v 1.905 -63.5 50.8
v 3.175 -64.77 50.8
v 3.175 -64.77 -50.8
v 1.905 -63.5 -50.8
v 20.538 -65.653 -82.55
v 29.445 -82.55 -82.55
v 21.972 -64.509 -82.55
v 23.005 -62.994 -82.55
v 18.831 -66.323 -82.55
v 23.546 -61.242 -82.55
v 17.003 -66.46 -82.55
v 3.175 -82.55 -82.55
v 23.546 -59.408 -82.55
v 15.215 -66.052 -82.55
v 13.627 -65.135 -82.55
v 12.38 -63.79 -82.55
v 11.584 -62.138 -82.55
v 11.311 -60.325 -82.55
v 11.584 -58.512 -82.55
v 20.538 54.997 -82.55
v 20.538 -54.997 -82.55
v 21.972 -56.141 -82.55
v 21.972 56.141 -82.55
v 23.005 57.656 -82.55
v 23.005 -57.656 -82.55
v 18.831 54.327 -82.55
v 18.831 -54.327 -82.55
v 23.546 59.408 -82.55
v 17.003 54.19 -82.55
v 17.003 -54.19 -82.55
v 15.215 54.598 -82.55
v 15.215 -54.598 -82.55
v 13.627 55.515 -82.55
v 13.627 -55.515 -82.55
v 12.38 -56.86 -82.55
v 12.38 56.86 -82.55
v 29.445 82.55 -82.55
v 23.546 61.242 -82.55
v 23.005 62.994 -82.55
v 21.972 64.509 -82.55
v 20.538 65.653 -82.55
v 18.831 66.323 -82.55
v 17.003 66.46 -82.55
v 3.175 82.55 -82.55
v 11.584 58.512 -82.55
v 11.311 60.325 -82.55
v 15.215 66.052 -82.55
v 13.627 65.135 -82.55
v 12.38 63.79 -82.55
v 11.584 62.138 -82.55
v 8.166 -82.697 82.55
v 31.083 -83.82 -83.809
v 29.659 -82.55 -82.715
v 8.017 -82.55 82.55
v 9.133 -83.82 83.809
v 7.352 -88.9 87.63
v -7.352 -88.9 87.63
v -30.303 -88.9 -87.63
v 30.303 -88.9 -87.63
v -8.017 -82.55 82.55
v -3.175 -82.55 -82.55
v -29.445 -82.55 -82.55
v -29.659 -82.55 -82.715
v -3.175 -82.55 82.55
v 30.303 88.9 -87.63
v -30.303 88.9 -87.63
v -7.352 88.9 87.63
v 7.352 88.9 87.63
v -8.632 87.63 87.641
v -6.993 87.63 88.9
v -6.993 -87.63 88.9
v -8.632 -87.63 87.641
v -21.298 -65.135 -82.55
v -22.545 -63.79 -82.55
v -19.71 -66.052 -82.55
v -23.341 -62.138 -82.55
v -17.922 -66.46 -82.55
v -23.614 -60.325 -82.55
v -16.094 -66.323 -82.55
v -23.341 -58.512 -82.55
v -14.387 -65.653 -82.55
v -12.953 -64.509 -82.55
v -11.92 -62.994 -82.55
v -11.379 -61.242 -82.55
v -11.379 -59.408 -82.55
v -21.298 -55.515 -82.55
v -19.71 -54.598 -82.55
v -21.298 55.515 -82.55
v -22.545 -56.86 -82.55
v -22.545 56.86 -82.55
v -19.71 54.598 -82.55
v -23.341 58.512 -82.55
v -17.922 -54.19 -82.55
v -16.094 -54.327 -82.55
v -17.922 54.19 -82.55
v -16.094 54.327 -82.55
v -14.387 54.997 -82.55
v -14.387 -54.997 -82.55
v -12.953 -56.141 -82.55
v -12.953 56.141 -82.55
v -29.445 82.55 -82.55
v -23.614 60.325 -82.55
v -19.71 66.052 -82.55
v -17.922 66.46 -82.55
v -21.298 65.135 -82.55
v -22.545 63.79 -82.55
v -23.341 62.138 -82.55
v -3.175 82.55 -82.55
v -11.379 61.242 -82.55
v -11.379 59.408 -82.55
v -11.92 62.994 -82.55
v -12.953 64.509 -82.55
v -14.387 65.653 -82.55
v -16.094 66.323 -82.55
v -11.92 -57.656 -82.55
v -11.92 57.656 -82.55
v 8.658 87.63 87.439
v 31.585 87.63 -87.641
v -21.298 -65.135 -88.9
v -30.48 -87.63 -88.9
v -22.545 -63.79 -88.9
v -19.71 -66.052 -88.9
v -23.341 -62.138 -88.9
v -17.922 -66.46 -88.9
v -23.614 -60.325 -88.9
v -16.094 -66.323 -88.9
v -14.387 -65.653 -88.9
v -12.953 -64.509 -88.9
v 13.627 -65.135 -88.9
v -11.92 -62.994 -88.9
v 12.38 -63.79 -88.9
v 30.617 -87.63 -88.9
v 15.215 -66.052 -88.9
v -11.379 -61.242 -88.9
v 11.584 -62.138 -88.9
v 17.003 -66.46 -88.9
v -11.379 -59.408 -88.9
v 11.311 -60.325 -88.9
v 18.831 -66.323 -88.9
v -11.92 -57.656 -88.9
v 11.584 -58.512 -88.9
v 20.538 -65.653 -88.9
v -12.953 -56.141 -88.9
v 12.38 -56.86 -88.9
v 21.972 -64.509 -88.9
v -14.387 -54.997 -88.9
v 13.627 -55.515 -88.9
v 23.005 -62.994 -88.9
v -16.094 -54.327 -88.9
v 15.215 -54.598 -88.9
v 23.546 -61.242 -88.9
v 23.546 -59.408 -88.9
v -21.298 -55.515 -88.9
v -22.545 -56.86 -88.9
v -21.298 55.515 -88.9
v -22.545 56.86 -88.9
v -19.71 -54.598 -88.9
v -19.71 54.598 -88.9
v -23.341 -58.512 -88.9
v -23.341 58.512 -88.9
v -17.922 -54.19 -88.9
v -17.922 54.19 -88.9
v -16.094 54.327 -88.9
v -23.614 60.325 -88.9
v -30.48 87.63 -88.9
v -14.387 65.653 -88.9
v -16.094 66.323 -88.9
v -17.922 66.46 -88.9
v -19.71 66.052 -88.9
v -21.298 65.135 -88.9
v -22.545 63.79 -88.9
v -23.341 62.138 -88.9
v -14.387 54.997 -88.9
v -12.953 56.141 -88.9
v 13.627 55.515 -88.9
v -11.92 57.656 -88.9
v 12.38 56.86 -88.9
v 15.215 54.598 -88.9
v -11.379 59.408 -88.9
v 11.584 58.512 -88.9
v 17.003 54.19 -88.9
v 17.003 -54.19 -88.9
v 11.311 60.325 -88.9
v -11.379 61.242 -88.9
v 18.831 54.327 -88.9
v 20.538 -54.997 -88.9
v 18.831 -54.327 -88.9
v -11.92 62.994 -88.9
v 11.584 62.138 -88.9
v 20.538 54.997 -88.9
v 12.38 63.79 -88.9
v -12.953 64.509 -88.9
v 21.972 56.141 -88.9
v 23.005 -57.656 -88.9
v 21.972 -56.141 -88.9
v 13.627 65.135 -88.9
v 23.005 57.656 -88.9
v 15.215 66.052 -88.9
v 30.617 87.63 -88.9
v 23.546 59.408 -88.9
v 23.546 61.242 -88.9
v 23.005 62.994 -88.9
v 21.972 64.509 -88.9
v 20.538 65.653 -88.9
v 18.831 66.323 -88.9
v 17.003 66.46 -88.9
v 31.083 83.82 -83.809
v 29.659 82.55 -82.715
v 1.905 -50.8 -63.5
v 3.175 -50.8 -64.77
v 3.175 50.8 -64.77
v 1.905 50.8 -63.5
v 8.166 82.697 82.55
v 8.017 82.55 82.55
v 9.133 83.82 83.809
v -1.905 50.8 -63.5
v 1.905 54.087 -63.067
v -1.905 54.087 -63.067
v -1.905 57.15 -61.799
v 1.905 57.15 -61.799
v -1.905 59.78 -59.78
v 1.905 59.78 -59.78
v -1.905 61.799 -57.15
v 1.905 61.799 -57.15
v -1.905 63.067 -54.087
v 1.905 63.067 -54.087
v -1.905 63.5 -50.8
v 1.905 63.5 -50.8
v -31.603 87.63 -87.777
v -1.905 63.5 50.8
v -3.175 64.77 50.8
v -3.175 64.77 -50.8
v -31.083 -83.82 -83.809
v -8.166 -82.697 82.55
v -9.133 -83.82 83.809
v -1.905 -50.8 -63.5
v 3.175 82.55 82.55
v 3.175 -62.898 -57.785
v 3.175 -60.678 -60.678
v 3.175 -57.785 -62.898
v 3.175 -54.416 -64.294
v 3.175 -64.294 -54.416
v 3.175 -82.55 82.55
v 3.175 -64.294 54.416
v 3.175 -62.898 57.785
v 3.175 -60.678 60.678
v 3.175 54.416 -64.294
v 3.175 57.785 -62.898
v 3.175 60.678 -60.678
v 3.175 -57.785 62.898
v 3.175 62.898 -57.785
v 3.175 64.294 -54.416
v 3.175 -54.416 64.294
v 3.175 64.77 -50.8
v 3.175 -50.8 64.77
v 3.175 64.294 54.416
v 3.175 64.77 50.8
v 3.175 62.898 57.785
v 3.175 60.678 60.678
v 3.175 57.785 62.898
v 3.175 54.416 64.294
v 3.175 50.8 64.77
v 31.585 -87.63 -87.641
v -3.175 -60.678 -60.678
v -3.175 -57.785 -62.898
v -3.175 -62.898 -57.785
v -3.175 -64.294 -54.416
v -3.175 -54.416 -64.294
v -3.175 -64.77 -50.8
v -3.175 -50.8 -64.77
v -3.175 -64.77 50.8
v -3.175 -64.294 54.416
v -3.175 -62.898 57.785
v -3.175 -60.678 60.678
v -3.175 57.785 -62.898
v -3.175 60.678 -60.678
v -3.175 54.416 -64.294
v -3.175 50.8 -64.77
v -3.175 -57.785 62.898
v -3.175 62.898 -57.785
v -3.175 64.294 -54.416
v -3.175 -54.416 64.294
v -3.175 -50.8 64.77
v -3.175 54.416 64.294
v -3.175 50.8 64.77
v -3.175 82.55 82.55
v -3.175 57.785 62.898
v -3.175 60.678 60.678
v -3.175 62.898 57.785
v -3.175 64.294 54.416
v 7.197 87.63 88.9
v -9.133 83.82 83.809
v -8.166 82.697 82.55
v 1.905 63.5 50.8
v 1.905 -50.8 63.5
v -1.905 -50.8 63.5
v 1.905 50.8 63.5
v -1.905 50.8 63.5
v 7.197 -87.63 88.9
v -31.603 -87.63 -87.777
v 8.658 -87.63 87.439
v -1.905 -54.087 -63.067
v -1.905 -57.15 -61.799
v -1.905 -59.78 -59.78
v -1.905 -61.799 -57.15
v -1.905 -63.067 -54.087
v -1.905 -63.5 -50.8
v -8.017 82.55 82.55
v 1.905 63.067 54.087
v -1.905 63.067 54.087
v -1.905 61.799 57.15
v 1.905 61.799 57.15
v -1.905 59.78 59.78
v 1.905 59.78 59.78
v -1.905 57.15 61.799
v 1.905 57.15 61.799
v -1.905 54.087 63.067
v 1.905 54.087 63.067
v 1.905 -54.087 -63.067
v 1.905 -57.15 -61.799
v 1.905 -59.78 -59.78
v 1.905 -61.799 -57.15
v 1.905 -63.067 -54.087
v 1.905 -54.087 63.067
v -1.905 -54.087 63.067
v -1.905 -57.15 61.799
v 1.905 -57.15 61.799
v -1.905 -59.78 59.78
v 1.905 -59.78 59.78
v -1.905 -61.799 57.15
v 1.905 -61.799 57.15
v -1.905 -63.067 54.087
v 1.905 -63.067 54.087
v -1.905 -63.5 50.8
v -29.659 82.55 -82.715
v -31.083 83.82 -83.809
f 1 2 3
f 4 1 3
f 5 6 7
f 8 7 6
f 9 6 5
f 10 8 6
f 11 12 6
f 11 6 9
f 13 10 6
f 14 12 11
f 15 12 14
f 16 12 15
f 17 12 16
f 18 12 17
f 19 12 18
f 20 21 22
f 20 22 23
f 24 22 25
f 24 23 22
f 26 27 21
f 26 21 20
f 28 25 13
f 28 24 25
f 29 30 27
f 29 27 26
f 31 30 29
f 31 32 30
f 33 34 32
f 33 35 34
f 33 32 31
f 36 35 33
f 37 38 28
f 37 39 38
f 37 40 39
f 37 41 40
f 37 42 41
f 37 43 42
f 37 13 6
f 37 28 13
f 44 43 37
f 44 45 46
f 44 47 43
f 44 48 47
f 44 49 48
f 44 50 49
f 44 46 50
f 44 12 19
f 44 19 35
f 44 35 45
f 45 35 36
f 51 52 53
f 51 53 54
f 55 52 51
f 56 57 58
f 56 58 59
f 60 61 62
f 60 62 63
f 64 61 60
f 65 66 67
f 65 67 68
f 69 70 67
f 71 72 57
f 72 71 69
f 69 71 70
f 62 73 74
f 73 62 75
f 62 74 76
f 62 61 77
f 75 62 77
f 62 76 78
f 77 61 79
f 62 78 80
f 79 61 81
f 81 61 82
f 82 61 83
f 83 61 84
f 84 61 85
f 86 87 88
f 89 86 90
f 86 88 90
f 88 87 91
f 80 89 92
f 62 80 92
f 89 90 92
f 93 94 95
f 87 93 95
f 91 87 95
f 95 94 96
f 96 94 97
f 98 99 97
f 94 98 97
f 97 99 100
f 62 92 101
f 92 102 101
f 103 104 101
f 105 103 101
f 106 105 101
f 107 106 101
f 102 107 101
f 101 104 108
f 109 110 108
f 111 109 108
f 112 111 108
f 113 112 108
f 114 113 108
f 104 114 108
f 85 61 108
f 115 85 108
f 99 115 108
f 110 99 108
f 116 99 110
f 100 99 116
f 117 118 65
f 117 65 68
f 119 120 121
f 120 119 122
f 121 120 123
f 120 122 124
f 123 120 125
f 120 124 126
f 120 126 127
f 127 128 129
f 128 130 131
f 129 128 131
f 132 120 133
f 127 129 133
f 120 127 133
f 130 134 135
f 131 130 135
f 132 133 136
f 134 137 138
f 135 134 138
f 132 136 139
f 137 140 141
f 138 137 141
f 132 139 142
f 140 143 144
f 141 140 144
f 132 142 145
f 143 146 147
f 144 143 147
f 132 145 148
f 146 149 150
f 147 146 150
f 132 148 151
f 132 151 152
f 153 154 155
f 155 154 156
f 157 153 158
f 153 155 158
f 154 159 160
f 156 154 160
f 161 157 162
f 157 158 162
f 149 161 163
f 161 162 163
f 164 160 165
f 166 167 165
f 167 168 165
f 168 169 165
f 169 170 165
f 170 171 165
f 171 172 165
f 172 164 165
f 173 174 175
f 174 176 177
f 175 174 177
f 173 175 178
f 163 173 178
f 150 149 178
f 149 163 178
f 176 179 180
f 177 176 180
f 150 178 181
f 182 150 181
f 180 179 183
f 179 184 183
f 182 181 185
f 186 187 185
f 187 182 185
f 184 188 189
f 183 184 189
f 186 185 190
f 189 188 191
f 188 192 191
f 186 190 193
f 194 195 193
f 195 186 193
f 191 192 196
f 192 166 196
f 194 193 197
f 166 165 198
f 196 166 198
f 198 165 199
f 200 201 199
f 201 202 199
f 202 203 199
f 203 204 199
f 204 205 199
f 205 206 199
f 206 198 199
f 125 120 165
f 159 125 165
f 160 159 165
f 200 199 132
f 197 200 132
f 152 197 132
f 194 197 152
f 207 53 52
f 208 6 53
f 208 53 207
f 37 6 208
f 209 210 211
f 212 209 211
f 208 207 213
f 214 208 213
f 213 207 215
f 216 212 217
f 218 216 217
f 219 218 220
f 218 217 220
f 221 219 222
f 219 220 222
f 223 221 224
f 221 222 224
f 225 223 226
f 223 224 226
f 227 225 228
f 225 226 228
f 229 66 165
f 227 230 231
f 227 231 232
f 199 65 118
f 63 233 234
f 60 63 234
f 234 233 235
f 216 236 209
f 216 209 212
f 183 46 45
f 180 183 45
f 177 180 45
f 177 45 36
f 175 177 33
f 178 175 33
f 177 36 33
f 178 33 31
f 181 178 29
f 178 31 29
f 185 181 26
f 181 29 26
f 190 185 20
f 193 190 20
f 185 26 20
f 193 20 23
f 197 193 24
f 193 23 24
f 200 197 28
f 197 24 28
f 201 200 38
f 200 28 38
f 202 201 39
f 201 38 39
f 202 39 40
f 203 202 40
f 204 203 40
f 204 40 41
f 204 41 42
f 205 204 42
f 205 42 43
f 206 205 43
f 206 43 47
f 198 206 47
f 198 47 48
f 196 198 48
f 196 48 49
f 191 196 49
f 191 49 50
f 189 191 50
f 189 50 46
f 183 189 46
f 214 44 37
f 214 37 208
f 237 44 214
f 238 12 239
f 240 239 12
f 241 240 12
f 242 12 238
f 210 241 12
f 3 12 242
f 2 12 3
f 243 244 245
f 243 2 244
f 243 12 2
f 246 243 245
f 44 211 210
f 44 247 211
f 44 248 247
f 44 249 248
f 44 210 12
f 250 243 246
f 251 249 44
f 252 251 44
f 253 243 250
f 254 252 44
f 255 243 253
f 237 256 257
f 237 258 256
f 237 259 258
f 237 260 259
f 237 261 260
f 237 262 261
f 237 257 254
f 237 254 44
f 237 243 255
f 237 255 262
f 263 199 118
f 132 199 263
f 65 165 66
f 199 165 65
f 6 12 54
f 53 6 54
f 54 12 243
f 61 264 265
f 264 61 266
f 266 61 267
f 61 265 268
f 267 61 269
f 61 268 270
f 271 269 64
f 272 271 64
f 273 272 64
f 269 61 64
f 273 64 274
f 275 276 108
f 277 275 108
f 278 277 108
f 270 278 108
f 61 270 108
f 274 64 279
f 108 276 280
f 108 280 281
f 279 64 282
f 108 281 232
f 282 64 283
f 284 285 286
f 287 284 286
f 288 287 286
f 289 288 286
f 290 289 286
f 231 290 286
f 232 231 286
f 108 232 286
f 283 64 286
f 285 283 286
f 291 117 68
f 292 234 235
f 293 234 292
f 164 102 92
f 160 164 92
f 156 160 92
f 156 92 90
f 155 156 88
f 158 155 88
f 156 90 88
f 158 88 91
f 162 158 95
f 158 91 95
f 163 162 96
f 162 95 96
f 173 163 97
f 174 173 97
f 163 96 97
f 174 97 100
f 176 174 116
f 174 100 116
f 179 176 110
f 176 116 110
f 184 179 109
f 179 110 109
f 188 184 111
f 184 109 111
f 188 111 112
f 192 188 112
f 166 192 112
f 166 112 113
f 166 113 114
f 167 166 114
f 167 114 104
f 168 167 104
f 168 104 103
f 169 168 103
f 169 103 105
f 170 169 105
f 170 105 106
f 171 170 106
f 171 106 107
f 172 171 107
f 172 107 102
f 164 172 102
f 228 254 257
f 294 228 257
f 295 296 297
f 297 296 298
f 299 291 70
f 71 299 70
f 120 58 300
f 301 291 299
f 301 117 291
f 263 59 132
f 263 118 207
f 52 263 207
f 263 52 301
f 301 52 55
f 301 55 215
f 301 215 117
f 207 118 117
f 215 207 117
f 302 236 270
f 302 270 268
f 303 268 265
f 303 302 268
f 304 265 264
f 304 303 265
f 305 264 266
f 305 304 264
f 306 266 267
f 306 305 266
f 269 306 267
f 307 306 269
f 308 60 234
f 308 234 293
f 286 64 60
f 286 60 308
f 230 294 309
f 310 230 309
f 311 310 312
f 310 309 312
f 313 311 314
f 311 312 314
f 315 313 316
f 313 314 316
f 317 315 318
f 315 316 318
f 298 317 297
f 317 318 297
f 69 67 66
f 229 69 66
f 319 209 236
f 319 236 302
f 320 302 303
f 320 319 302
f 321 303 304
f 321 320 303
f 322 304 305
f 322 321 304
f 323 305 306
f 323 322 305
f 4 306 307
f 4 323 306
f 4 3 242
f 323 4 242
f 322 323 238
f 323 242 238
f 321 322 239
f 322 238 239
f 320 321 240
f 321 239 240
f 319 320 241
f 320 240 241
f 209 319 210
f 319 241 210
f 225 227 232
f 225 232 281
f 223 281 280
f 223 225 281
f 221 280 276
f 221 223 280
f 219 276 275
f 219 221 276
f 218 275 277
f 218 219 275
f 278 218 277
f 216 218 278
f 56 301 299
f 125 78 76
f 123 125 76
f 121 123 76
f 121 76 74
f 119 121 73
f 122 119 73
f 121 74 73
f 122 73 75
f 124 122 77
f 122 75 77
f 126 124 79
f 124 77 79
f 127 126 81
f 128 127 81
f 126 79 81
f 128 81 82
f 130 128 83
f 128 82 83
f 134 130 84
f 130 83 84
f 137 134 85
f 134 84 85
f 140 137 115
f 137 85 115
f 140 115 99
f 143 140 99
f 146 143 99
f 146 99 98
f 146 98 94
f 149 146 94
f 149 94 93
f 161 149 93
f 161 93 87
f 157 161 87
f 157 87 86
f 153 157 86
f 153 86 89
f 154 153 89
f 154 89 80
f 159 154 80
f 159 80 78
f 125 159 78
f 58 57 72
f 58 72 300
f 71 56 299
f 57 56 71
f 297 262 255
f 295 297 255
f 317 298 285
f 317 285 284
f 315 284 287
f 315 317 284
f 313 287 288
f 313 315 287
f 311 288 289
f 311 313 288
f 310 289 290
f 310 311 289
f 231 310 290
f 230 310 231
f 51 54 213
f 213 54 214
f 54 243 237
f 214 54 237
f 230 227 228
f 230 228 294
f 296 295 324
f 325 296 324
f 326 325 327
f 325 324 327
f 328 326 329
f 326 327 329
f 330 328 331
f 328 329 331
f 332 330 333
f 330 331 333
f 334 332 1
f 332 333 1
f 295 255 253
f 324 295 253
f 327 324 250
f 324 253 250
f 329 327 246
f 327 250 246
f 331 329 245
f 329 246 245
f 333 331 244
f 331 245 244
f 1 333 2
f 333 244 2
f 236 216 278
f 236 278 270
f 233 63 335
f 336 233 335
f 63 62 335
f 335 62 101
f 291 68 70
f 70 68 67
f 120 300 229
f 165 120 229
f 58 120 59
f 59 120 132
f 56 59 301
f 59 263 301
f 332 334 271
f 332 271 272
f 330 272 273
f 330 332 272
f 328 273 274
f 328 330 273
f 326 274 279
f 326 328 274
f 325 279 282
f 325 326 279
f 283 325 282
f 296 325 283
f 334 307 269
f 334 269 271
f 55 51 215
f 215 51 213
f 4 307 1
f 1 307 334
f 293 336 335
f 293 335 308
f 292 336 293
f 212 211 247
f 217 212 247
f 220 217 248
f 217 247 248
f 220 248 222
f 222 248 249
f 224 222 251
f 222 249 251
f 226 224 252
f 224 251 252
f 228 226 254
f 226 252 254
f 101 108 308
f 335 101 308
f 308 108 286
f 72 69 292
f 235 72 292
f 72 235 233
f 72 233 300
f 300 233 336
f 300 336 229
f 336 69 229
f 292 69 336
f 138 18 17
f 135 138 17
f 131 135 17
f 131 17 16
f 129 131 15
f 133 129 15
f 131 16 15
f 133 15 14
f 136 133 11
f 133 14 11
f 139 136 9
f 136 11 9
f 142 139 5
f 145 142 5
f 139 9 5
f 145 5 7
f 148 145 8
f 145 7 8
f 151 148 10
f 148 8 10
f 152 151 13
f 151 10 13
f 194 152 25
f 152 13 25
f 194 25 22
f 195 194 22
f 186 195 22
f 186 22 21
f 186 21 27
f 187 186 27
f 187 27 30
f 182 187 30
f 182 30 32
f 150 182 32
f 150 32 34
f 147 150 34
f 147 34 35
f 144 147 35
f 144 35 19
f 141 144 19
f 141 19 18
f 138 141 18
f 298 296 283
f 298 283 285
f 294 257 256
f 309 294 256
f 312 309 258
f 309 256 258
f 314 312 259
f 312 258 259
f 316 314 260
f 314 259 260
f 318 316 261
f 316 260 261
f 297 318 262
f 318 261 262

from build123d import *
from OCP.BRepFilletAPI import BRepFilletAPI_MakeChamfer

# Parameters (mm, degrees)
BOSS_EXTRUDE1_DEPTH      = 88.9
CUT_EXTRUDE2_DEPTH       = 130.67066939
CUT_EXTRUDE2_DEPTH_BACK  = 130.67066939
SKETCH12_W               = 127
SKETCH12_H               = 127
CUT_EXTRUDE3_START       = -3.175
SKETCH11_W               = 165.1
SKETCH11_H               = 165.1
CUT_EXTRUDE3_DEPTH       = 127.49566939
CUT_EXTRUDE4_START       = 3.175
SKETCH11_2_W             = 165.1
SKETCH11_2_H             = 165.1
CUT_EXTRUDE4_DEPTH       = 127.49566939
FILLET3_R                = 12.7
F_9_16_12_TAPPED_HOLE1_D = 12.30376
CHAMFER2_SIZE            = 1.27
CHAMFER2_SIZE2           = 1.132534886
CHAMFER2_SIZE2_2         = 1.47384677


with BuildPart() as part:
    # Sketch1 → Boss-Extrude1 (new, symmetric)
    with BuildSketch(Plane(origin=(0, 0, 0), x_dir=(-1, 0, 0), z_dir=(0, 1, 0))):
        Polygon((31.75, -88.9), (-31.75, -88.9), (-8.466666667, 88.9), (8.466666667, 88.9), align=None)
    extrude(amount=BOSS_EXTRUDE1_DEPTH, both=True)

    # Sketch12 → Cut-Extrude2 (cut, two sides: drawn at the far end of the back side and taken through both)
    with BuildSketch(Plane.YZ.offset(-CUT_EXTRUDE2_DEPTH_BACK)):
        Rectangle(SKETCH12_W, SKETCH12_H)
    extrude(amount=CUT_EXTRUDE2_DEPTH + CUT_EXTRUDE2_DEPTH_BACK, mode=Mode.SUBTRACT)

    # Sketch11 → Cut-Extrude3 (cut, through all)
    with BuildSketch(Plane.YZ.offset(CUT_EXTRUDE3_START)):
        Rectangle(SKETCH11_W, SKETCH11_H)
    extrude(amount=-CUT_EXTRUDE3_DEPTH, mode=Mode.SUBTRACT)

    # Sketch11<2> → Cut-Extrude4 (cut, through all)
    with BuildSketch(Plane.YZ.offset(CUT_EXTRUDE4_START)):
        Rectangle(SKETCH11_2_W, SKETCH11_2_H)
    extrude(amount=CUT_EXTRUDE4_DEPTH, mode=Mode.SUBTRACT)

    # Fillet3
    fillet3_edges = [part.edges().sort_by_distance(p)[0] for p in [
        (0, -63.5, 63.5),
        (0, 63.5, 63.5),
        (0, -63.5, -63.5),
        (0, 63.5, -63.5),
    ]]
    fillet(fillet3_edges, radius=FILLET3_R)

    # 9/16-12 Tapped Hole1 (through all)
    with Locations(Plane(origin=(0, 0, -88.9), x_dir=(1, 0, 0), z_dir=(0, 0, -1))):
        with Locations((-17.4625, 60.325), (17.4625, 60.325), (17.4625, -60.325), (-17.4625, -60.325)):
            Hole(F_9_16_12_TAPPED_HOLE1_D / 2)

    # Chamfer2: one chamfer whose edges measure the first distance from different faces: ONE call of the kernel's chamfer builder (chamfer() names one face for all edges)
    chamfer2_edges_1 = [part.edges().sort_by_distance(p)[0] for p in [
        (-3.175, -63.5, 0),
        (3.175, 0, -63.5),
        (-3.175, 0, -63.5),
        (3.175, 59.780256121, 59.780256121),
        (-3.175, 59.780256121, 59.780256121),
        (3.175, -59.780256121, 59.780256121),
        (-3.175, -59.780256121, 59.780256121),
        (3.175, -59.780256121, -59.780256121),
        (-3.175, -59.780256121, -59.780256121),
        (3.175, 59.780256121, -59.780256121),
        (-3.175, 59.780256121, -59.780256121),
        (0, 88.9, -88.9),
        (20.108333333, 88.9, 0),
        (-20.108333333, -82.55, 0),
        (-20.108333333, 82.55, 0),
        (0, 88.9, 88.9),
        (20.108333333, -88.9, 0),
        (0, -88.9, -88.9),
        (-20.108333333, -88.9, 0),
        (0, -88.9, 88.9),
        (20.108333333, -82.55, 0),
        (20.108333333, 82.55, 0),
        (-20.108333333, 88.9, 0),
        (3.175, 0, 63.5),
        (-3.175, 0, 63.5),
        (3.175, 63.5, 0),
        (-3.175, 63.5, 0),
        (3.175, -63.5, 0),
    ]]
    chamfer2_edges_2 = [part.edges().sort_by_distance(p)[0] for p in [
        (-9.298214286, 0, 82.55),
    ]]
    chamfer2_side_2 = [part.faces().sort_by_distance(p)[0] for p in [
        (-8.794551937, 0, 86.396148844),
    ]]
    chamfer2_edges_3 = [part.edges().sort_by_distance(p)[0] for p in [
        (-30.918452381, 0, -82.55),
        (-8.466666667, 0, 88.9),
    ]]
    chamfer2_side_3 = [part.faces().sort_by_distance(p)[0] for p in [
        (-8.794551937, 0, 86.396148844),
    ]]
    chamfer2_edges_4 = [part.edges().sort_by_distance(p)[0] for p in [
        (30.918452381, 0, -82.55),
    ]]
    chamfer2_side_4 = [part.faces().sort_by_distance(p)[0] for p in [
        (20.108333333, -86.374771424, 0),
    ]]
    chamfer2_edges_5 = [part.edges().sort_by_distance(p)[0] for p in [
        (9.298214286, 0, 82.55),
        (31.75, 0, -88.9),
    ]]
    chamfer2_side_5 = [part.faces().sort_by_distance(p)[0] for p in [
        (20.108333333, -86.374771424, 0),
    ]]
    chamfer2_edges_6 = [part.edges().sort_by_distance(p)[0] for p in [
        (8.466666667, 0, 88.9),
    ]]
    chamfer2_side_6 = [part.faces().sort_by_distance(p)[0] for p in [
        (0, 0, 88.9),
    ]]
    chamfer2_edges_7 = [part.edges().sort_by_distance(p)[0] for p in [
        (-31.75, 0, -88.9),
    ]]
    chamfer2_side_7 = [part.faces().sort_by_distance(p)[0] for p in [
        (0, 0, -88.9),
    ]]
    chamfer2 = BRepFilletAPI_MakeChamfer(part.part.solid().wrapped)
    for e in chamfer2_edges_1:
        chamfer2.Add(CHAMFER2_SIZE, e.wrapped)
    for e in chamfer2_edges_2:
        chamfer2.Add(CHAMFER2_SIZE, CHAMFER2_SIZE2, e.wrapped, chamfer2_side_2[0].wrapped)  # the first distance lies on this face
    for e in chamfer2_edges_3:
        chamfer2.Add(CHAMFER2_SIZE, CHAMFER2_SIZE2_2, e.wrapped, chamfer2_side_3[0].wrapped)  # the first distance lies on this face
    for e in chamfer2_edges_4:
        chamfer2.Add(CHAMFER2_SIZE, CHAMFER2_SIZE2_2, e.wrapped, chamfer2_side_4[0].wrapped)  # the first distance lies on this face
    for e in chamfer2_edges_5:
        chamfer2.Add(CHAMFER2_SIZE, CHAMFER2_SIZE2, e.wrapped, chamfer2_side_5[0].wrapped)  # the first distance lies on this face
    for e in chamfer2_edges_6:
        chamfer2.Add(CHAMFER2_SIZE, CHAMFER2_SIZE2_2, e.wrapped, chamfer2_side_6[0].wrapped)  # the first distance lies on this face
    for e in chamfer2_edges_7:
        chamfer2.Add(CHAMFER2_SIZE, CHAMFER2_SIZE2, e.wrapped, chamfer2_side_7[0].wrapped)  # the first distance lies on this face
    add(Compound.cast(chamfer2.Shape()), mode=Mode.REPLACE)


solid = part.part
